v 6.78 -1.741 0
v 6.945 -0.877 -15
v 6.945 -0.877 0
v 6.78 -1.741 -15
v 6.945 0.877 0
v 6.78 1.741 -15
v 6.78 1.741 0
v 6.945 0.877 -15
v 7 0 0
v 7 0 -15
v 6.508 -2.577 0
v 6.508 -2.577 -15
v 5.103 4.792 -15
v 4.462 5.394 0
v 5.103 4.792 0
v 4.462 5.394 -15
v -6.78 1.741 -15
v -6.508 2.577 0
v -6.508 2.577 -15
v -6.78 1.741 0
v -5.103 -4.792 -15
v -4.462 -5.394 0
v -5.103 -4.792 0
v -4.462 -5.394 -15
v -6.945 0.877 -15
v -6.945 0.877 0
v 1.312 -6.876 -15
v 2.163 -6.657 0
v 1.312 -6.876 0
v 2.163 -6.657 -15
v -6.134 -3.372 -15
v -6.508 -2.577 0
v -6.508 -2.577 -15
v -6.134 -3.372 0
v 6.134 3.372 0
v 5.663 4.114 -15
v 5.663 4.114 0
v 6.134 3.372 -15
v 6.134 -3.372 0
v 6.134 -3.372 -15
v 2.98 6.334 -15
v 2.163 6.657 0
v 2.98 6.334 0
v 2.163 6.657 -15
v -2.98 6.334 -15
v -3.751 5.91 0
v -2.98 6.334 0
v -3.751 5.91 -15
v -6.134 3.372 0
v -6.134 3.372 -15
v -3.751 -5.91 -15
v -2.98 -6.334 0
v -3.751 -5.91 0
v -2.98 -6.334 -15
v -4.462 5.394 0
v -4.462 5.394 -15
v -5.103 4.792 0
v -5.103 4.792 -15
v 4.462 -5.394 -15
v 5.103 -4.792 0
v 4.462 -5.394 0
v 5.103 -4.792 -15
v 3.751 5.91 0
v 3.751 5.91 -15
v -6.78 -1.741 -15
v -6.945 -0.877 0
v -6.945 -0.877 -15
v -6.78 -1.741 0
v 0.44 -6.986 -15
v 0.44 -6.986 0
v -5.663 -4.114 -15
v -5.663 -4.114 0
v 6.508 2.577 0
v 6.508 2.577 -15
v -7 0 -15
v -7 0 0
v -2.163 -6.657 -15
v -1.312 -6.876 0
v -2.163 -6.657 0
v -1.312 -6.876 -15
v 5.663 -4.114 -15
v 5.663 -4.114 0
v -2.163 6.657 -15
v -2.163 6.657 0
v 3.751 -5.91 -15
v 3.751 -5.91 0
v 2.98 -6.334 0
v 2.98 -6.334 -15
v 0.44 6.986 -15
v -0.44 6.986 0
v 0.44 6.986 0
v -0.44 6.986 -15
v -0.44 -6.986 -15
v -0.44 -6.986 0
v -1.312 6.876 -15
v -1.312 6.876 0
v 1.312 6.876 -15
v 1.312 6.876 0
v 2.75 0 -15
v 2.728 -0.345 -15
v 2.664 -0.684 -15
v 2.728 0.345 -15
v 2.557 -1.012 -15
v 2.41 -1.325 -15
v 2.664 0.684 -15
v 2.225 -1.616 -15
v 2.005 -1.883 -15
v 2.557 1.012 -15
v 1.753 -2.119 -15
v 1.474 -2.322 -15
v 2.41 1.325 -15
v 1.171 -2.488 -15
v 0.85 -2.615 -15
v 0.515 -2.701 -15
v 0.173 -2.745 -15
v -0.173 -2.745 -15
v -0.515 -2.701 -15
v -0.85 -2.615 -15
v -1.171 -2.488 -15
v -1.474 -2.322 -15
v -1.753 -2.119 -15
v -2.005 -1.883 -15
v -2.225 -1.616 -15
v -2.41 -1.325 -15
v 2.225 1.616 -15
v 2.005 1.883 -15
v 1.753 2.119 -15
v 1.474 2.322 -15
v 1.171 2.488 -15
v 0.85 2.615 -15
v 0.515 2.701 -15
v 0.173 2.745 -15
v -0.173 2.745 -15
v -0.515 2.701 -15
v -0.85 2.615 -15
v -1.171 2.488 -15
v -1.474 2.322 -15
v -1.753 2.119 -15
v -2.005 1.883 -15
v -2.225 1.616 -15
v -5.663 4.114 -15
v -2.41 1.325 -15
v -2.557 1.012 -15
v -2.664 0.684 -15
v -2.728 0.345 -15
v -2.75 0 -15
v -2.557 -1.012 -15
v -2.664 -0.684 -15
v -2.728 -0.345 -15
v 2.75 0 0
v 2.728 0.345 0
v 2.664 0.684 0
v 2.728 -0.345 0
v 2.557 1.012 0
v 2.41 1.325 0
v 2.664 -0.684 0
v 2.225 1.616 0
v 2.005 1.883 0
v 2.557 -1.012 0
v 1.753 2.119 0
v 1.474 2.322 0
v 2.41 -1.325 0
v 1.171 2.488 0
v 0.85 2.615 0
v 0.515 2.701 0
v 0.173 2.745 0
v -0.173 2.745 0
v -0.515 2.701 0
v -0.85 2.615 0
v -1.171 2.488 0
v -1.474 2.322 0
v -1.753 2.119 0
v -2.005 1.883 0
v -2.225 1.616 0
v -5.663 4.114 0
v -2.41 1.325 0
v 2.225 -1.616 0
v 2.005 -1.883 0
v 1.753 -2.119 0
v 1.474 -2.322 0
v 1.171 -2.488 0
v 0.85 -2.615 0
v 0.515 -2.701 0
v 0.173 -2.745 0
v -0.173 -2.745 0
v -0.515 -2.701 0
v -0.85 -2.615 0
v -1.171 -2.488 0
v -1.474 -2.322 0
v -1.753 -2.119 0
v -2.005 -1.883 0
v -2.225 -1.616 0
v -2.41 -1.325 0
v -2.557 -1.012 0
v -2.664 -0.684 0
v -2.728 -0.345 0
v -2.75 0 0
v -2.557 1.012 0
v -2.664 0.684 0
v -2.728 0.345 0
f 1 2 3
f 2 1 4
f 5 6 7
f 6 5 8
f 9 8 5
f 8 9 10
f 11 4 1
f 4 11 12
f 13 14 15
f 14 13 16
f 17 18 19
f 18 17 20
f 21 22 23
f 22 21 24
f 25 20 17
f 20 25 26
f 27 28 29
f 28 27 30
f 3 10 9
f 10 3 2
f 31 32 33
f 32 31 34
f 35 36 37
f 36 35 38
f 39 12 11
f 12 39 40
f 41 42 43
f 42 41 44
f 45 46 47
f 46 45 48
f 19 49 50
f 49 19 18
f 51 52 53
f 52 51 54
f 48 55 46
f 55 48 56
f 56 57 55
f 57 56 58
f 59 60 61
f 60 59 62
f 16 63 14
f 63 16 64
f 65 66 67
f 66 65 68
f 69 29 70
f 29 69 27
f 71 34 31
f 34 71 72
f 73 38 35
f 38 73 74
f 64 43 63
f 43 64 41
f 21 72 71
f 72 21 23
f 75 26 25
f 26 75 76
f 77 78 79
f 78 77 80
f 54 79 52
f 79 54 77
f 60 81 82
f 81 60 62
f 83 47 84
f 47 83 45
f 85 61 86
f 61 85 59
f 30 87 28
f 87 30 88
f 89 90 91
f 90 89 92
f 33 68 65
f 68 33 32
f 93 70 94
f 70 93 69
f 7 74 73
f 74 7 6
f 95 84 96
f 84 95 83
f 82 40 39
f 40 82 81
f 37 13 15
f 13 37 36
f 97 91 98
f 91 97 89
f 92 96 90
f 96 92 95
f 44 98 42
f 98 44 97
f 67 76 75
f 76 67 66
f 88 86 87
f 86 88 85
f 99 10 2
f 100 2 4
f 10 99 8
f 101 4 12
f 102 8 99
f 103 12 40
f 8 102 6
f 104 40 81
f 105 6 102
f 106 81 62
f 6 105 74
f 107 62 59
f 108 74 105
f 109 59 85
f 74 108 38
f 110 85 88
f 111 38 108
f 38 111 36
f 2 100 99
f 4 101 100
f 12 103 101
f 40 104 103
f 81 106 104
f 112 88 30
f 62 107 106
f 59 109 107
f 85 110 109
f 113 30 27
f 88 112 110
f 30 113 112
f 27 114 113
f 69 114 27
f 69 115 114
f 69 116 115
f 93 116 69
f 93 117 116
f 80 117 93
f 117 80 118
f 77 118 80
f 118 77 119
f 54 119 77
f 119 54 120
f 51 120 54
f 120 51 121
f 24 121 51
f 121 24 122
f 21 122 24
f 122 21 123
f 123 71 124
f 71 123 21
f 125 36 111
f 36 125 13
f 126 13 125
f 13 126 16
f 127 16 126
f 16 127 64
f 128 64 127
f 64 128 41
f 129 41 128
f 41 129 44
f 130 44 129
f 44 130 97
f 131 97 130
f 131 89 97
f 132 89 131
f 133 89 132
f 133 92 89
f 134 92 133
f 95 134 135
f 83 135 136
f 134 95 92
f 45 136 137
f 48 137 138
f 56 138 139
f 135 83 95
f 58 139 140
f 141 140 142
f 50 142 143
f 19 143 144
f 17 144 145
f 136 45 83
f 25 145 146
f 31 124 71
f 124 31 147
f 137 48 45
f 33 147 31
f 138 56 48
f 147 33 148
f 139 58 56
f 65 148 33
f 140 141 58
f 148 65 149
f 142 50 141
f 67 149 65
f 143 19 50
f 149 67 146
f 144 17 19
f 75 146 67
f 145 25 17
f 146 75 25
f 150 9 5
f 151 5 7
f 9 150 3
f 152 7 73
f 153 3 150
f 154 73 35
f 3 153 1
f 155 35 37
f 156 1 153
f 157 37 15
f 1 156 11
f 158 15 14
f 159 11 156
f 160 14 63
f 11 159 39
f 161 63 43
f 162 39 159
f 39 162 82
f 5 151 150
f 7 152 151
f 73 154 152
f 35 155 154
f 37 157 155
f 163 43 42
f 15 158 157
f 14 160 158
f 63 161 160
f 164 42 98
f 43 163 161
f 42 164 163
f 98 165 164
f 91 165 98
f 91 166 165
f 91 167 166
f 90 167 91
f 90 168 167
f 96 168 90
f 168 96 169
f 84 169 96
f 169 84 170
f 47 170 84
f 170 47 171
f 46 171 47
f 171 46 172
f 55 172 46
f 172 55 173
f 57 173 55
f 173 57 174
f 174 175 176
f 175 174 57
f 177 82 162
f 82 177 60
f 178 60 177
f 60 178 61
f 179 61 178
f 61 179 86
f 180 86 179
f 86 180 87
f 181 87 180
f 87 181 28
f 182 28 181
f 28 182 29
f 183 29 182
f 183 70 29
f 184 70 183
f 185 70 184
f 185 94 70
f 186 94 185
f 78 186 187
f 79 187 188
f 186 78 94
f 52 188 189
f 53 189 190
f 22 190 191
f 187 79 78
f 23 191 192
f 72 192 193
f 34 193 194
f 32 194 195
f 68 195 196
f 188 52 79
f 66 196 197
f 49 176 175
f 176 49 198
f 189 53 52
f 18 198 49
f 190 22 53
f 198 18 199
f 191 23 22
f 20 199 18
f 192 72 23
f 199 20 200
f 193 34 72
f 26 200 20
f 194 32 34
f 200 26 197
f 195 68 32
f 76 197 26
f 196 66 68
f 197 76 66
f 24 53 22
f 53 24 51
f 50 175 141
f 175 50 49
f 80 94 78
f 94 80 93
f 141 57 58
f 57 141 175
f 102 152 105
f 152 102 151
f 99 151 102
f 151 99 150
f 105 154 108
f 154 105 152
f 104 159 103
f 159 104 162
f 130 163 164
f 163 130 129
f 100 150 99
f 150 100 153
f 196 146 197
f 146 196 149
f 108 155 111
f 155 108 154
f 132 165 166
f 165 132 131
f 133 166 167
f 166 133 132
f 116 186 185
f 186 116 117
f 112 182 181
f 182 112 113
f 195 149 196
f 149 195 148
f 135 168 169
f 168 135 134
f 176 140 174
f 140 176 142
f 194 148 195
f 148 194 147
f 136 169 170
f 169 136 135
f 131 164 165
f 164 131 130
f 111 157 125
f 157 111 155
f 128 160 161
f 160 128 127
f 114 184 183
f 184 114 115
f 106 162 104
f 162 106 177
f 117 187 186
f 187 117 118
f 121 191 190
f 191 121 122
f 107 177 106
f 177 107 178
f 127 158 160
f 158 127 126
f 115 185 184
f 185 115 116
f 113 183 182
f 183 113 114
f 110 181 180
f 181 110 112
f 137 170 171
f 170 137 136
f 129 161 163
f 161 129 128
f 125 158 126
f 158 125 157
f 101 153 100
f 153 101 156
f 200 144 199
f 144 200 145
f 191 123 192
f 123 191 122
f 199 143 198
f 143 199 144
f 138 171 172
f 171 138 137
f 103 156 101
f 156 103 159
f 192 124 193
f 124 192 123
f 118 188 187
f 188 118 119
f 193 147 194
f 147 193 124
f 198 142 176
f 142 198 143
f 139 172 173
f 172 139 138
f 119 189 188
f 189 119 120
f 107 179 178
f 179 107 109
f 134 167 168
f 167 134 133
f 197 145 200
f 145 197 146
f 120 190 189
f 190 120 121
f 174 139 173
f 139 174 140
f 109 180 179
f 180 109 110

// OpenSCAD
$fn = 50;


difference() {
	union() {
		translate(v = [0, 0, -15.0000000000]) {
			cylinder(h = 15, r = 7.0000000000);
		}
	}
	union() {
		#translate(v = [0, 0, -15]) {
			cylinder(h = 15, r = 2.7500000000);
		}
	}
}
